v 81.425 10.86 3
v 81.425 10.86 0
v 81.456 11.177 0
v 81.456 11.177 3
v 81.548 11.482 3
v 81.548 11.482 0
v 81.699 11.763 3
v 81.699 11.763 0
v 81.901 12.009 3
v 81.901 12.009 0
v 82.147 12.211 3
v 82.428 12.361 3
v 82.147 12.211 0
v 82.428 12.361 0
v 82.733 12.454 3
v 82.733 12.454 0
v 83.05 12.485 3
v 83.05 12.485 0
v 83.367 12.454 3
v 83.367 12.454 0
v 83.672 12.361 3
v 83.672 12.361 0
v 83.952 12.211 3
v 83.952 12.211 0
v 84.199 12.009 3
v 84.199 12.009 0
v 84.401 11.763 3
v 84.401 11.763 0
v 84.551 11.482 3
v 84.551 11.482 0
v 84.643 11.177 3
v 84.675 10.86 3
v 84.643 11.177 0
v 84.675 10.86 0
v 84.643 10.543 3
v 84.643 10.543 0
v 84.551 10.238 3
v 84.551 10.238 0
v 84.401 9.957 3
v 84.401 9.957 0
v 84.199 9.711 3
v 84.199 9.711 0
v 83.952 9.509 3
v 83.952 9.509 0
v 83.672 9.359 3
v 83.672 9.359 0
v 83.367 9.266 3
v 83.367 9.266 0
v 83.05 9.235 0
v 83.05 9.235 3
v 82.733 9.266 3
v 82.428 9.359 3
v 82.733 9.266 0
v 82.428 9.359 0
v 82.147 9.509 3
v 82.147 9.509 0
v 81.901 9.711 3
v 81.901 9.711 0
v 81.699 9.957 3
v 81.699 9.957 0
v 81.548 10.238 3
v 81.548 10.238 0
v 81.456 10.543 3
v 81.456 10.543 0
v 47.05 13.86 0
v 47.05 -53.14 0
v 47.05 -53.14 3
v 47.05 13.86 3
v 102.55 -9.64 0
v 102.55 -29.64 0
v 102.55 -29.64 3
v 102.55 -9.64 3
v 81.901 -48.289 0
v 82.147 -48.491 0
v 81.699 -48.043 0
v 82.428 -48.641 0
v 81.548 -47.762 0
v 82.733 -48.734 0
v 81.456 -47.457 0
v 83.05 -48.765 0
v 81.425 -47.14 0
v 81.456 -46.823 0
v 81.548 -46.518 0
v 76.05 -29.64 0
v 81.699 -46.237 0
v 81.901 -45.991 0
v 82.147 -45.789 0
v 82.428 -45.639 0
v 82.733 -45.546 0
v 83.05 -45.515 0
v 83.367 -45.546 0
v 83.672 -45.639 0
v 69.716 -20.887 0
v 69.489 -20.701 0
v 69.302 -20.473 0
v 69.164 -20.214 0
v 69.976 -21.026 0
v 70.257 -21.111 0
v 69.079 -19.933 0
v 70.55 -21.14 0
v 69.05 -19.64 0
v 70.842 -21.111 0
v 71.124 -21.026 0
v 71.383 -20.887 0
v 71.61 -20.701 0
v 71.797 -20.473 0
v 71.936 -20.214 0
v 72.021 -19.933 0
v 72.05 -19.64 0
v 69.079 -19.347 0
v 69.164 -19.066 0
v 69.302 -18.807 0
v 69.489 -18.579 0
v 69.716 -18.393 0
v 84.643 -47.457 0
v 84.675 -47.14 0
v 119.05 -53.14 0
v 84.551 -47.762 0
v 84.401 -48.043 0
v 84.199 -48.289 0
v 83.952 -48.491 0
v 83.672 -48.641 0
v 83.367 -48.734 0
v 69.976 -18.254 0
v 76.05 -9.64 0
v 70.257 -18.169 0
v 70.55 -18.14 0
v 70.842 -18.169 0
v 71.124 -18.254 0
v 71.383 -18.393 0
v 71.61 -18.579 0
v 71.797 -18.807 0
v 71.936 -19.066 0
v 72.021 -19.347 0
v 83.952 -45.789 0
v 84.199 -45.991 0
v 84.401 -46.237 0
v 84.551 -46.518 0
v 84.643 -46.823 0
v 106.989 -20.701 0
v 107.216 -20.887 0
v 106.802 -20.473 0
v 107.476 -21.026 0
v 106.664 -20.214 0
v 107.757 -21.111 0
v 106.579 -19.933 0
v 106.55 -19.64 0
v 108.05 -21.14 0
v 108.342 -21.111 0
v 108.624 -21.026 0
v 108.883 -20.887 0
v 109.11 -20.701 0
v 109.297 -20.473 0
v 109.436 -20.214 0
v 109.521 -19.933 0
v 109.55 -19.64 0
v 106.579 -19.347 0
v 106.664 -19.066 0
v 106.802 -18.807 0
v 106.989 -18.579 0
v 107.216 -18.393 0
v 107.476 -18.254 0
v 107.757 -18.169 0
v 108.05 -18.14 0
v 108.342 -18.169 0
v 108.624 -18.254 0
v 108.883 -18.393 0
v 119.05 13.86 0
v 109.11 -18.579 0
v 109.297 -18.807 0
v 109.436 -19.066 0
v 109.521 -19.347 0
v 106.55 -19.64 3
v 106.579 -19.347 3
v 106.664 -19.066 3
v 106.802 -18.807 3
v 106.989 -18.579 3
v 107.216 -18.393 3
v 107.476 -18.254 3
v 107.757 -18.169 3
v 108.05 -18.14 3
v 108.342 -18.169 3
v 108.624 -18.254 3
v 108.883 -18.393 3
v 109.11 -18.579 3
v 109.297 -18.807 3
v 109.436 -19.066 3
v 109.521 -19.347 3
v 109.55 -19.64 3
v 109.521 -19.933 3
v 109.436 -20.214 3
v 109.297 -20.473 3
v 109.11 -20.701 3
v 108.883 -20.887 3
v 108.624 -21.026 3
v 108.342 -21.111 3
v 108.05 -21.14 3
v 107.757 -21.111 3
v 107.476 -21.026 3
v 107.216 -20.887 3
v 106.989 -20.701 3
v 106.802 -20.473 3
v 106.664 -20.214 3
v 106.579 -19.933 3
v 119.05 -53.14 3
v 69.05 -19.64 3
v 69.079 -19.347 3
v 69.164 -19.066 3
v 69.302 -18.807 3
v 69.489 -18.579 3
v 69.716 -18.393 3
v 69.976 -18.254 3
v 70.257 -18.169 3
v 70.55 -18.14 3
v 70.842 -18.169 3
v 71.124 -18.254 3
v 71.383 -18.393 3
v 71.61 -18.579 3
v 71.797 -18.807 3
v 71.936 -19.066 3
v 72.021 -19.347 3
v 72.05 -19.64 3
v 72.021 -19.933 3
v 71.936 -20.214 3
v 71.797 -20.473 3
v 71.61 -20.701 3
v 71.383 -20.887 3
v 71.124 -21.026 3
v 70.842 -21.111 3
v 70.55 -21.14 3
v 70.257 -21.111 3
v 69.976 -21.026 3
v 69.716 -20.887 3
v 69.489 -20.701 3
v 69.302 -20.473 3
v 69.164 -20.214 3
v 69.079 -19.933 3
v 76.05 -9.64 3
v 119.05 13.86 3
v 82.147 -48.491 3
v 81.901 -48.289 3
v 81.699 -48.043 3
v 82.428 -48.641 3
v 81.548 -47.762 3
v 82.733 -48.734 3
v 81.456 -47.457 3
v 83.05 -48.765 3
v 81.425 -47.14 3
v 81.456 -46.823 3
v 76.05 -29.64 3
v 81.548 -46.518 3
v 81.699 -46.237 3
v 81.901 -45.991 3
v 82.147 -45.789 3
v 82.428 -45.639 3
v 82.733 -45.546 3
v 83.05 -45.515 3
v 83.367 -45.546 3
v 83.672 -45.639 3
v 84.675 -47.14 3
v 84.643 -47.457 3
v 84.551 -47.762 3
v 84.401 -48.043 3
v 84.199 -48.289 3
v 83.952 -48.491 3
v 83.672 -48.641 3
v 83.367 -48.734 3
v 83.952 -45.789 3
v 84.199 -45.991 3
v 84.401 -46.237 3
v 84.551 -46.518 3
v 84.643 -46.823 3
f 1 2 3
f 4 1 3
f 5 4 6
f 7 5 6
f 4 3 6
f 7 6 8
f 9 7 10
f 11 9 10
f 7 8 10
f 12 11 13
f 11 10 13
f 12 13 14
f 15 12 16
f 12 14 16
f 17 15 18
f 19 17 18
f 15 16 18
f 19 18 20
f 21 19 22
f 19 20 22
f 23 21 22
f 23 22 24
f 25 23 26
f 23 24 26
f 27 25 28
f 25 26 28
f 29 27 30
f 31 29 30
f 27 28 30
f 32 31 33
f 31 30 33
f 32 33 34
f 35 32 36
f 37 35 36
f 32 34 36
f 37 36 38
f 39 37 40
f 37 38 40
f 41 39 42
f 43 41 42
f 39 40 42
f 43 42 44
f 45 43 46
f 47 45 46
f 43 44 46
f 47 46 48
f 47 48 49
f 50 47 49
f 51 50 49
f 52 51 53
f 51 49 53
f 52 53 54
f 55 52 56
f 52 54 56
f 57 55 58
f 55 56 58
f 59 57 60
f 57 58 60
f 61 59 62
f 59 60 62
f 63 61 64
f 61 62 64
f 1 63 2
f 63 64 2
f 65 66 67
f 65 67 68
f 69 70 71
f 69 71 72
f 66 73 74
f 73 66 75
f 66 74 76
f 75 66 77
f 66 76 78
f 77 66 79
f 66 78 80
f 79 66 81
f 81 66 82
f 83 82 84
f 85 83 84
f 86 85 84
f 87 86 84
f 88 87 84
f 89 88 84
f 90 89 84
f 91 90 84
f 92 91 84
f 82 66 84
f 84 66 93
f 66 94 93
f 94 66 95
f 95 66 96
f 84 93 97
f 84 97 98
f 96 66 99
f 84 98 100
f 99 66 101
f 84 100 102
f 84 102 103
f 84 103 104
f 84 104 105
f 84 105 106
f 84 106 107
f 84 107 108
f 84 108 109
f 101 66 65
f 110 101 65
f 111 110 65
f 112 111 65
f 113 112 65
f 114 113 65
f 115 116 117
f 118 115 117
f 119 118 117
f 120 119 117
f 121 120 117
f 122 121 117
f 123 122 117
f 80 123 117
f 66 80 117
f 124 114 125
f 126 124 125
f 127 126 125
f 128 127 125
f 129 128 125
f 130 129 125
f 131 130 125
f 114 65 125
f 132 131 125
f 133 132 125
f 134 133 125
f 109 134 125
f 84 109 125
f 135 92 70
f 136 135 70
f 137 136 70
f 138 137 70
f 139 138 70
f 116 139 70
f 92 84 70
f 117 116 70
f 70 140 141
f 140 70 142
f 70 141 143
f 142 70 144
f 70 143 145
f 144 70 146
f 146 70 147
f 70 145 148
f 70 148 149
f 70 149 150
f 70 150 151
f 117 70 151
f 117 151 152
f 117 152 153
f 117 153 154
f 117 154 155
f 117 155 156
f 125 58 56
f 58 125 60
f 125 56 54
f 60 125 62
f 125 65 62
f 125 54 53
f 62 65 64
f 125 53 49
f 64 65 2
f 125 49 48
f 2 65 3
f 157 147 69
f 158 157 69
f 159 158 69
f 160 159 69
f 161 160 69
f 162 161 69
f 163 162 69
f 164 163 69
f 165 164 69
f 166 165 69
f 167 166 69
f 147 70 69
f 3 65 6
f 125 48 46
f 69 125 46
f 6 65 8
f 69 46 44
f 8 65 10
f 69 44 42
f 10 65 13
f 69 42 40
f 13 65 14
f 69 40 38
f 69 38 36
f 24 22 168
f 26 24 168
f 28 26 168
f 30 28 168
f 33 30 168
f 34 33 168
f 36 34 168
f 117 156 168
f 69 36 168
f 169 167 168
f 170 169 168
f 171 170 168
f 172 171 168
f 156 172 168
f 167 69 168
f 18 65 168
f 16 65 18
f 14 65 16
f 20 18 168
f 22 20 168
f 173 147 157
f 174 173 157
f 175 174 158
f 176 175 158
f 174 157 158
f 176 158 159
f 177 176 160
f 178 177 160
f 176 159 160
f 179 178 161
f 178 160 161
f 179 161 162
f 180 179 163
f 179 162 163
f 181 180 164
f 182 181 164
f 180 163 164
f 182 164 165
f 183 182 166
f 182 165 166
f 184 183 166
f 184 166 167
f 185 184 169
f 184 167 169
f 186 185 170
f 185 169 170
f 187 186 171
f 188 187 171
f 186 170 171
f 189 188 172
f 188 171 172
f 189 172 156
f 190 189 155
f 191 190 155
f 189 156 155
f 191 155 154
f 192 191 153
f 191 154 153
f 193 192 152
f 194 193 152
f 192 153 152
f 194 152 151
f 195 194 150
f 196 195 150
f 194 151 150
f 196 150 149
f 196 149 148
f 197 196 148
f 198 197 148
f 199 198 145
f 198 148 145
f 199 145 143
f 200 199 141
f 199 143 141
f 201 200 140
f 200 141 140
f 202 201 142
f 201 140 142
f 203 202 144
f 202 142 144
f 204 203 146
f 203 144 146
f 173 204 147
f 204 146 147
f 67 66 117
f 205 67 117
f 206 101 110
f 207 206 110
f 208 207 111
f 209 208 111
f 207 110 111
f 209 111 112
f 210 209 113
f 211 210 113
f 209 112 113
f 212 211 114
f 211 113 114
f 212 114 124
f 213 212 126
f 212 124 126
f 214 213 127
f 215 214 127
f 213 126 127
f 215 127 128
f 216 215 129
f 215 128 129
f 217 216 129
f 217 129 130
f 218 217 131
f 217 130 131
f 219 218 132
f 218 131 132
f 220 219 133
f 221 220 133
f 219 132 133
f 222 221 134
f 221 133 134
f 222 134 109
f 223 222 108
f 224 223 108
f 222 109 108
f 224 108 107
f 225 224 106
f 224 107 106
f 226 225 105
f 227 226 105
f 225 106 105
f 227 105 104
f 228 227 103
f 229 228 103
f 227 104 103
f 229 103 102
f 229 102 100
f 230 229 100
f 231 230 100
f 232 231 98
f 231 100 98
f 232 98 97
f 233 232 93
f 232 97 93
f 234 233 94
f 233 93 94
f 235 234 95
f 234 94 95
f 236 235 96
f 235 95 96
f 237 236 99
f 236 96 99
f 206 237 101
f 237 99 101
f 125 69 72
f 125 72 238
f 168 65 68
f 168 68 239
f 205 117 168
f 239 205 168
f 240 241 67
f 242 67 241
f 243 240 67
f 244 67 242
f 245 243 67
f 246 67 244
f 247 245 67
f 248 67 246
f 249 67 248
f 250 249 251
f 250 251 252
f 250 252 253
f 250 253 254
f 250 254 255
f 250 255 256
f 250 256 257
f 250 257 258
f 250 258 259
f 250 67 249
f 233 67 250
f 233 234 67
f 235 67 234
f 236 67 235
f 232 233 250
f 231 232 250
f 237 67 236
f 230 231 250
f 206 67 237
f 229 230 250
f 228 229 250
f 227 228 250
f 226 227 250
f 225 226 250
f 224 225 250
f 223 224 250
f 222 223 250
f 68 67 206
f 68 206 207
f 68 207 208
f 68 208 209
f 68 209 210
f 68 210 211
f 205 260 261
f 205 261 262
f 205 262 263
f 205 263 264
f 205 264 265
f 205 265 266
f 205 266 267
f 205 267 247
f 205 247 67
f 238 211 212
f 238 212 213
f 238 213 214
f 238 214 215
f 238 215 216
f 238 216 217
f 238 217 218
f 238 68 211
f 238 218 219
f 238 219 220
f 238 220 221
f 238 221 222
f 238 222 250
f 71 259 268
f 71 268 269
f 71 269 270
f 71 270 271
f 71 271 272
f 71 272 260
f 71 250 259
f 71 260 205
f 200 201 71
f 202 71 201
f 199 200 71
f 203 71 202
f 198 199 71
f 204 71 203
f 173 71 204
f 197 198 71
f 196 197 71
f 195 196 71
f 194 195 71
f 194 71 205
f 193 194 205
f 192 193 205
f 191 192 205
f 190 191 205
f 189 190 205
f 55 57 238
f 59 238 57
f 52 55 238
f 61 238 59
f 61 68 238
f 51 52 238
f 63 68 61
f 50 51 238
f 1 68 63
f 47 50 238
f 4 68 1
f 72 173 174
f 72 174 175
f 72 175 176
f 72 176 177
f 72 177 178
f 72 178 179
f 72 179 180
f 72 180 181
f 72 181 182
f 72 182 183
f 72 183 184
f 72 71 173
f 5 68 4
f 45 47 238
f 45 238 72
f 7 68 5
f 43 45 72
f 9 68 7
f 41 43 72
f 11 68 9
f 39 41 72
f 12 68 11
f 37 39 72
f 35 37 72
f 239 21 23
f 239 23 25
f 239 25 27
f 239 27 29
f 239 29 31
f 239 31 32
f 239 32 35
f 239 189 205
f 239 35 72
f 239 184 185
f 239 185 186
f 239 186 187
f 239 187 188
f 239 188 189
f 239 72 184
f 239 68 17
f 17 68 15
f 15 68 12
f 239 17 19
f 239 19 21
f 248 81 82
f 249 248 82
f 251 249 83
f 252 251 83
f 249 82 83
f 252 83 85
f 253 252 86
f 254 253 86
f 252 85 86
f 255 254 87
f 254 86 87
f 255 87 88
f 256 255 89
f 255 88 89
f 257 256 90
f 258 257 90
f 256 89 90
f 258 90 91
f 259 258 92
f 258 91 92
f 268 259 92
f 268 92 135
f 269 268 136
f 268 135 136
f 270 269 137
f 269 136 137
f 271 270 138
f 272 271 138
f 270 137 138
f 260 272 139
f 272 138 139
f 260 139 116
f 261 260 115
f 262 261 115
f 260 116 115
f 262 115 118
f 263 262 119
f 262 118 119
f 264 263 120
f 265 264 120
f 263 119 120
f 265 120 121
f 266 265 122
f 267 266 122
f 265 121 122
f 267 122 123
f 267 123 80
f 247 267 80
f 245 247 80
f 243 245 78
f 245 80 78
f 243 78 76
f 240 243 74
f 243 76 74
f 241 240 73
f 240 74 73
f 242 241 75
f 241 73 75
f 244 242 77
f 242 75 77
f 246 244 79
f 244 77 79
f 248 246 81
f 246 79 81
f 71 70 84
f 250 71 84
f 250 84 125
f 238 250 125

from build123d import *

# Parameters (mm, degrees)
CROQUIS1_W              = 72
CROQUIS1_H              = 67
SALIENTE_EXTRUIR1_DEPTH = 3
CROQUIS4_R              = 1.625
CROQUIS4_R_2            = 1.5
CROQUIS4_W              = 26.5
CROQUIS4_H              = 20
CORTAR_EXTRUIR2_DEPTH   = 3


with BuildPart() as part:
    # Croquis1 → Saliente-Extruir1 (new body)
    with BuildSketch(Plane.XY):
        with Locations((83.049688553, -19.639954107)):
            Rectangle(CROQUIS1_W, CROQUIS1_H)
    extrude(amount=SALIENTE_EXTRUIR1_DEPTH)

    # Croquis4 → Cortar-Extruir2 (cut)
    with BuildSketch(Plane(origin=(0, 0, 0), x_dir=(-1, 0, 0), z_dir=(0, 0, -1))):
        with Locations((-83.049688553, -47.139954107)):
            Circle(CROQUIS4_R)
        with Locations((-83.049688553, 10.860045893)):
            Circle(CROQUIS4_R)
        with Locations((-108.049688553, -19.639954107)):
            Circle(CROQUIS4_R_2)
        with Locations((-70.549688553, -19.639954107)):
            Circle(CROQUIS4_R_2)
        with Locations((-89.299688553, -19.639954107)):
            Rectangle(CROQUIS4_W, CROQUIS4_H)
    extrude(amount=-CORTAR_EXTRUIR2_DEPTH, mode=Mode.SUBTRACT)


solid = part.part
